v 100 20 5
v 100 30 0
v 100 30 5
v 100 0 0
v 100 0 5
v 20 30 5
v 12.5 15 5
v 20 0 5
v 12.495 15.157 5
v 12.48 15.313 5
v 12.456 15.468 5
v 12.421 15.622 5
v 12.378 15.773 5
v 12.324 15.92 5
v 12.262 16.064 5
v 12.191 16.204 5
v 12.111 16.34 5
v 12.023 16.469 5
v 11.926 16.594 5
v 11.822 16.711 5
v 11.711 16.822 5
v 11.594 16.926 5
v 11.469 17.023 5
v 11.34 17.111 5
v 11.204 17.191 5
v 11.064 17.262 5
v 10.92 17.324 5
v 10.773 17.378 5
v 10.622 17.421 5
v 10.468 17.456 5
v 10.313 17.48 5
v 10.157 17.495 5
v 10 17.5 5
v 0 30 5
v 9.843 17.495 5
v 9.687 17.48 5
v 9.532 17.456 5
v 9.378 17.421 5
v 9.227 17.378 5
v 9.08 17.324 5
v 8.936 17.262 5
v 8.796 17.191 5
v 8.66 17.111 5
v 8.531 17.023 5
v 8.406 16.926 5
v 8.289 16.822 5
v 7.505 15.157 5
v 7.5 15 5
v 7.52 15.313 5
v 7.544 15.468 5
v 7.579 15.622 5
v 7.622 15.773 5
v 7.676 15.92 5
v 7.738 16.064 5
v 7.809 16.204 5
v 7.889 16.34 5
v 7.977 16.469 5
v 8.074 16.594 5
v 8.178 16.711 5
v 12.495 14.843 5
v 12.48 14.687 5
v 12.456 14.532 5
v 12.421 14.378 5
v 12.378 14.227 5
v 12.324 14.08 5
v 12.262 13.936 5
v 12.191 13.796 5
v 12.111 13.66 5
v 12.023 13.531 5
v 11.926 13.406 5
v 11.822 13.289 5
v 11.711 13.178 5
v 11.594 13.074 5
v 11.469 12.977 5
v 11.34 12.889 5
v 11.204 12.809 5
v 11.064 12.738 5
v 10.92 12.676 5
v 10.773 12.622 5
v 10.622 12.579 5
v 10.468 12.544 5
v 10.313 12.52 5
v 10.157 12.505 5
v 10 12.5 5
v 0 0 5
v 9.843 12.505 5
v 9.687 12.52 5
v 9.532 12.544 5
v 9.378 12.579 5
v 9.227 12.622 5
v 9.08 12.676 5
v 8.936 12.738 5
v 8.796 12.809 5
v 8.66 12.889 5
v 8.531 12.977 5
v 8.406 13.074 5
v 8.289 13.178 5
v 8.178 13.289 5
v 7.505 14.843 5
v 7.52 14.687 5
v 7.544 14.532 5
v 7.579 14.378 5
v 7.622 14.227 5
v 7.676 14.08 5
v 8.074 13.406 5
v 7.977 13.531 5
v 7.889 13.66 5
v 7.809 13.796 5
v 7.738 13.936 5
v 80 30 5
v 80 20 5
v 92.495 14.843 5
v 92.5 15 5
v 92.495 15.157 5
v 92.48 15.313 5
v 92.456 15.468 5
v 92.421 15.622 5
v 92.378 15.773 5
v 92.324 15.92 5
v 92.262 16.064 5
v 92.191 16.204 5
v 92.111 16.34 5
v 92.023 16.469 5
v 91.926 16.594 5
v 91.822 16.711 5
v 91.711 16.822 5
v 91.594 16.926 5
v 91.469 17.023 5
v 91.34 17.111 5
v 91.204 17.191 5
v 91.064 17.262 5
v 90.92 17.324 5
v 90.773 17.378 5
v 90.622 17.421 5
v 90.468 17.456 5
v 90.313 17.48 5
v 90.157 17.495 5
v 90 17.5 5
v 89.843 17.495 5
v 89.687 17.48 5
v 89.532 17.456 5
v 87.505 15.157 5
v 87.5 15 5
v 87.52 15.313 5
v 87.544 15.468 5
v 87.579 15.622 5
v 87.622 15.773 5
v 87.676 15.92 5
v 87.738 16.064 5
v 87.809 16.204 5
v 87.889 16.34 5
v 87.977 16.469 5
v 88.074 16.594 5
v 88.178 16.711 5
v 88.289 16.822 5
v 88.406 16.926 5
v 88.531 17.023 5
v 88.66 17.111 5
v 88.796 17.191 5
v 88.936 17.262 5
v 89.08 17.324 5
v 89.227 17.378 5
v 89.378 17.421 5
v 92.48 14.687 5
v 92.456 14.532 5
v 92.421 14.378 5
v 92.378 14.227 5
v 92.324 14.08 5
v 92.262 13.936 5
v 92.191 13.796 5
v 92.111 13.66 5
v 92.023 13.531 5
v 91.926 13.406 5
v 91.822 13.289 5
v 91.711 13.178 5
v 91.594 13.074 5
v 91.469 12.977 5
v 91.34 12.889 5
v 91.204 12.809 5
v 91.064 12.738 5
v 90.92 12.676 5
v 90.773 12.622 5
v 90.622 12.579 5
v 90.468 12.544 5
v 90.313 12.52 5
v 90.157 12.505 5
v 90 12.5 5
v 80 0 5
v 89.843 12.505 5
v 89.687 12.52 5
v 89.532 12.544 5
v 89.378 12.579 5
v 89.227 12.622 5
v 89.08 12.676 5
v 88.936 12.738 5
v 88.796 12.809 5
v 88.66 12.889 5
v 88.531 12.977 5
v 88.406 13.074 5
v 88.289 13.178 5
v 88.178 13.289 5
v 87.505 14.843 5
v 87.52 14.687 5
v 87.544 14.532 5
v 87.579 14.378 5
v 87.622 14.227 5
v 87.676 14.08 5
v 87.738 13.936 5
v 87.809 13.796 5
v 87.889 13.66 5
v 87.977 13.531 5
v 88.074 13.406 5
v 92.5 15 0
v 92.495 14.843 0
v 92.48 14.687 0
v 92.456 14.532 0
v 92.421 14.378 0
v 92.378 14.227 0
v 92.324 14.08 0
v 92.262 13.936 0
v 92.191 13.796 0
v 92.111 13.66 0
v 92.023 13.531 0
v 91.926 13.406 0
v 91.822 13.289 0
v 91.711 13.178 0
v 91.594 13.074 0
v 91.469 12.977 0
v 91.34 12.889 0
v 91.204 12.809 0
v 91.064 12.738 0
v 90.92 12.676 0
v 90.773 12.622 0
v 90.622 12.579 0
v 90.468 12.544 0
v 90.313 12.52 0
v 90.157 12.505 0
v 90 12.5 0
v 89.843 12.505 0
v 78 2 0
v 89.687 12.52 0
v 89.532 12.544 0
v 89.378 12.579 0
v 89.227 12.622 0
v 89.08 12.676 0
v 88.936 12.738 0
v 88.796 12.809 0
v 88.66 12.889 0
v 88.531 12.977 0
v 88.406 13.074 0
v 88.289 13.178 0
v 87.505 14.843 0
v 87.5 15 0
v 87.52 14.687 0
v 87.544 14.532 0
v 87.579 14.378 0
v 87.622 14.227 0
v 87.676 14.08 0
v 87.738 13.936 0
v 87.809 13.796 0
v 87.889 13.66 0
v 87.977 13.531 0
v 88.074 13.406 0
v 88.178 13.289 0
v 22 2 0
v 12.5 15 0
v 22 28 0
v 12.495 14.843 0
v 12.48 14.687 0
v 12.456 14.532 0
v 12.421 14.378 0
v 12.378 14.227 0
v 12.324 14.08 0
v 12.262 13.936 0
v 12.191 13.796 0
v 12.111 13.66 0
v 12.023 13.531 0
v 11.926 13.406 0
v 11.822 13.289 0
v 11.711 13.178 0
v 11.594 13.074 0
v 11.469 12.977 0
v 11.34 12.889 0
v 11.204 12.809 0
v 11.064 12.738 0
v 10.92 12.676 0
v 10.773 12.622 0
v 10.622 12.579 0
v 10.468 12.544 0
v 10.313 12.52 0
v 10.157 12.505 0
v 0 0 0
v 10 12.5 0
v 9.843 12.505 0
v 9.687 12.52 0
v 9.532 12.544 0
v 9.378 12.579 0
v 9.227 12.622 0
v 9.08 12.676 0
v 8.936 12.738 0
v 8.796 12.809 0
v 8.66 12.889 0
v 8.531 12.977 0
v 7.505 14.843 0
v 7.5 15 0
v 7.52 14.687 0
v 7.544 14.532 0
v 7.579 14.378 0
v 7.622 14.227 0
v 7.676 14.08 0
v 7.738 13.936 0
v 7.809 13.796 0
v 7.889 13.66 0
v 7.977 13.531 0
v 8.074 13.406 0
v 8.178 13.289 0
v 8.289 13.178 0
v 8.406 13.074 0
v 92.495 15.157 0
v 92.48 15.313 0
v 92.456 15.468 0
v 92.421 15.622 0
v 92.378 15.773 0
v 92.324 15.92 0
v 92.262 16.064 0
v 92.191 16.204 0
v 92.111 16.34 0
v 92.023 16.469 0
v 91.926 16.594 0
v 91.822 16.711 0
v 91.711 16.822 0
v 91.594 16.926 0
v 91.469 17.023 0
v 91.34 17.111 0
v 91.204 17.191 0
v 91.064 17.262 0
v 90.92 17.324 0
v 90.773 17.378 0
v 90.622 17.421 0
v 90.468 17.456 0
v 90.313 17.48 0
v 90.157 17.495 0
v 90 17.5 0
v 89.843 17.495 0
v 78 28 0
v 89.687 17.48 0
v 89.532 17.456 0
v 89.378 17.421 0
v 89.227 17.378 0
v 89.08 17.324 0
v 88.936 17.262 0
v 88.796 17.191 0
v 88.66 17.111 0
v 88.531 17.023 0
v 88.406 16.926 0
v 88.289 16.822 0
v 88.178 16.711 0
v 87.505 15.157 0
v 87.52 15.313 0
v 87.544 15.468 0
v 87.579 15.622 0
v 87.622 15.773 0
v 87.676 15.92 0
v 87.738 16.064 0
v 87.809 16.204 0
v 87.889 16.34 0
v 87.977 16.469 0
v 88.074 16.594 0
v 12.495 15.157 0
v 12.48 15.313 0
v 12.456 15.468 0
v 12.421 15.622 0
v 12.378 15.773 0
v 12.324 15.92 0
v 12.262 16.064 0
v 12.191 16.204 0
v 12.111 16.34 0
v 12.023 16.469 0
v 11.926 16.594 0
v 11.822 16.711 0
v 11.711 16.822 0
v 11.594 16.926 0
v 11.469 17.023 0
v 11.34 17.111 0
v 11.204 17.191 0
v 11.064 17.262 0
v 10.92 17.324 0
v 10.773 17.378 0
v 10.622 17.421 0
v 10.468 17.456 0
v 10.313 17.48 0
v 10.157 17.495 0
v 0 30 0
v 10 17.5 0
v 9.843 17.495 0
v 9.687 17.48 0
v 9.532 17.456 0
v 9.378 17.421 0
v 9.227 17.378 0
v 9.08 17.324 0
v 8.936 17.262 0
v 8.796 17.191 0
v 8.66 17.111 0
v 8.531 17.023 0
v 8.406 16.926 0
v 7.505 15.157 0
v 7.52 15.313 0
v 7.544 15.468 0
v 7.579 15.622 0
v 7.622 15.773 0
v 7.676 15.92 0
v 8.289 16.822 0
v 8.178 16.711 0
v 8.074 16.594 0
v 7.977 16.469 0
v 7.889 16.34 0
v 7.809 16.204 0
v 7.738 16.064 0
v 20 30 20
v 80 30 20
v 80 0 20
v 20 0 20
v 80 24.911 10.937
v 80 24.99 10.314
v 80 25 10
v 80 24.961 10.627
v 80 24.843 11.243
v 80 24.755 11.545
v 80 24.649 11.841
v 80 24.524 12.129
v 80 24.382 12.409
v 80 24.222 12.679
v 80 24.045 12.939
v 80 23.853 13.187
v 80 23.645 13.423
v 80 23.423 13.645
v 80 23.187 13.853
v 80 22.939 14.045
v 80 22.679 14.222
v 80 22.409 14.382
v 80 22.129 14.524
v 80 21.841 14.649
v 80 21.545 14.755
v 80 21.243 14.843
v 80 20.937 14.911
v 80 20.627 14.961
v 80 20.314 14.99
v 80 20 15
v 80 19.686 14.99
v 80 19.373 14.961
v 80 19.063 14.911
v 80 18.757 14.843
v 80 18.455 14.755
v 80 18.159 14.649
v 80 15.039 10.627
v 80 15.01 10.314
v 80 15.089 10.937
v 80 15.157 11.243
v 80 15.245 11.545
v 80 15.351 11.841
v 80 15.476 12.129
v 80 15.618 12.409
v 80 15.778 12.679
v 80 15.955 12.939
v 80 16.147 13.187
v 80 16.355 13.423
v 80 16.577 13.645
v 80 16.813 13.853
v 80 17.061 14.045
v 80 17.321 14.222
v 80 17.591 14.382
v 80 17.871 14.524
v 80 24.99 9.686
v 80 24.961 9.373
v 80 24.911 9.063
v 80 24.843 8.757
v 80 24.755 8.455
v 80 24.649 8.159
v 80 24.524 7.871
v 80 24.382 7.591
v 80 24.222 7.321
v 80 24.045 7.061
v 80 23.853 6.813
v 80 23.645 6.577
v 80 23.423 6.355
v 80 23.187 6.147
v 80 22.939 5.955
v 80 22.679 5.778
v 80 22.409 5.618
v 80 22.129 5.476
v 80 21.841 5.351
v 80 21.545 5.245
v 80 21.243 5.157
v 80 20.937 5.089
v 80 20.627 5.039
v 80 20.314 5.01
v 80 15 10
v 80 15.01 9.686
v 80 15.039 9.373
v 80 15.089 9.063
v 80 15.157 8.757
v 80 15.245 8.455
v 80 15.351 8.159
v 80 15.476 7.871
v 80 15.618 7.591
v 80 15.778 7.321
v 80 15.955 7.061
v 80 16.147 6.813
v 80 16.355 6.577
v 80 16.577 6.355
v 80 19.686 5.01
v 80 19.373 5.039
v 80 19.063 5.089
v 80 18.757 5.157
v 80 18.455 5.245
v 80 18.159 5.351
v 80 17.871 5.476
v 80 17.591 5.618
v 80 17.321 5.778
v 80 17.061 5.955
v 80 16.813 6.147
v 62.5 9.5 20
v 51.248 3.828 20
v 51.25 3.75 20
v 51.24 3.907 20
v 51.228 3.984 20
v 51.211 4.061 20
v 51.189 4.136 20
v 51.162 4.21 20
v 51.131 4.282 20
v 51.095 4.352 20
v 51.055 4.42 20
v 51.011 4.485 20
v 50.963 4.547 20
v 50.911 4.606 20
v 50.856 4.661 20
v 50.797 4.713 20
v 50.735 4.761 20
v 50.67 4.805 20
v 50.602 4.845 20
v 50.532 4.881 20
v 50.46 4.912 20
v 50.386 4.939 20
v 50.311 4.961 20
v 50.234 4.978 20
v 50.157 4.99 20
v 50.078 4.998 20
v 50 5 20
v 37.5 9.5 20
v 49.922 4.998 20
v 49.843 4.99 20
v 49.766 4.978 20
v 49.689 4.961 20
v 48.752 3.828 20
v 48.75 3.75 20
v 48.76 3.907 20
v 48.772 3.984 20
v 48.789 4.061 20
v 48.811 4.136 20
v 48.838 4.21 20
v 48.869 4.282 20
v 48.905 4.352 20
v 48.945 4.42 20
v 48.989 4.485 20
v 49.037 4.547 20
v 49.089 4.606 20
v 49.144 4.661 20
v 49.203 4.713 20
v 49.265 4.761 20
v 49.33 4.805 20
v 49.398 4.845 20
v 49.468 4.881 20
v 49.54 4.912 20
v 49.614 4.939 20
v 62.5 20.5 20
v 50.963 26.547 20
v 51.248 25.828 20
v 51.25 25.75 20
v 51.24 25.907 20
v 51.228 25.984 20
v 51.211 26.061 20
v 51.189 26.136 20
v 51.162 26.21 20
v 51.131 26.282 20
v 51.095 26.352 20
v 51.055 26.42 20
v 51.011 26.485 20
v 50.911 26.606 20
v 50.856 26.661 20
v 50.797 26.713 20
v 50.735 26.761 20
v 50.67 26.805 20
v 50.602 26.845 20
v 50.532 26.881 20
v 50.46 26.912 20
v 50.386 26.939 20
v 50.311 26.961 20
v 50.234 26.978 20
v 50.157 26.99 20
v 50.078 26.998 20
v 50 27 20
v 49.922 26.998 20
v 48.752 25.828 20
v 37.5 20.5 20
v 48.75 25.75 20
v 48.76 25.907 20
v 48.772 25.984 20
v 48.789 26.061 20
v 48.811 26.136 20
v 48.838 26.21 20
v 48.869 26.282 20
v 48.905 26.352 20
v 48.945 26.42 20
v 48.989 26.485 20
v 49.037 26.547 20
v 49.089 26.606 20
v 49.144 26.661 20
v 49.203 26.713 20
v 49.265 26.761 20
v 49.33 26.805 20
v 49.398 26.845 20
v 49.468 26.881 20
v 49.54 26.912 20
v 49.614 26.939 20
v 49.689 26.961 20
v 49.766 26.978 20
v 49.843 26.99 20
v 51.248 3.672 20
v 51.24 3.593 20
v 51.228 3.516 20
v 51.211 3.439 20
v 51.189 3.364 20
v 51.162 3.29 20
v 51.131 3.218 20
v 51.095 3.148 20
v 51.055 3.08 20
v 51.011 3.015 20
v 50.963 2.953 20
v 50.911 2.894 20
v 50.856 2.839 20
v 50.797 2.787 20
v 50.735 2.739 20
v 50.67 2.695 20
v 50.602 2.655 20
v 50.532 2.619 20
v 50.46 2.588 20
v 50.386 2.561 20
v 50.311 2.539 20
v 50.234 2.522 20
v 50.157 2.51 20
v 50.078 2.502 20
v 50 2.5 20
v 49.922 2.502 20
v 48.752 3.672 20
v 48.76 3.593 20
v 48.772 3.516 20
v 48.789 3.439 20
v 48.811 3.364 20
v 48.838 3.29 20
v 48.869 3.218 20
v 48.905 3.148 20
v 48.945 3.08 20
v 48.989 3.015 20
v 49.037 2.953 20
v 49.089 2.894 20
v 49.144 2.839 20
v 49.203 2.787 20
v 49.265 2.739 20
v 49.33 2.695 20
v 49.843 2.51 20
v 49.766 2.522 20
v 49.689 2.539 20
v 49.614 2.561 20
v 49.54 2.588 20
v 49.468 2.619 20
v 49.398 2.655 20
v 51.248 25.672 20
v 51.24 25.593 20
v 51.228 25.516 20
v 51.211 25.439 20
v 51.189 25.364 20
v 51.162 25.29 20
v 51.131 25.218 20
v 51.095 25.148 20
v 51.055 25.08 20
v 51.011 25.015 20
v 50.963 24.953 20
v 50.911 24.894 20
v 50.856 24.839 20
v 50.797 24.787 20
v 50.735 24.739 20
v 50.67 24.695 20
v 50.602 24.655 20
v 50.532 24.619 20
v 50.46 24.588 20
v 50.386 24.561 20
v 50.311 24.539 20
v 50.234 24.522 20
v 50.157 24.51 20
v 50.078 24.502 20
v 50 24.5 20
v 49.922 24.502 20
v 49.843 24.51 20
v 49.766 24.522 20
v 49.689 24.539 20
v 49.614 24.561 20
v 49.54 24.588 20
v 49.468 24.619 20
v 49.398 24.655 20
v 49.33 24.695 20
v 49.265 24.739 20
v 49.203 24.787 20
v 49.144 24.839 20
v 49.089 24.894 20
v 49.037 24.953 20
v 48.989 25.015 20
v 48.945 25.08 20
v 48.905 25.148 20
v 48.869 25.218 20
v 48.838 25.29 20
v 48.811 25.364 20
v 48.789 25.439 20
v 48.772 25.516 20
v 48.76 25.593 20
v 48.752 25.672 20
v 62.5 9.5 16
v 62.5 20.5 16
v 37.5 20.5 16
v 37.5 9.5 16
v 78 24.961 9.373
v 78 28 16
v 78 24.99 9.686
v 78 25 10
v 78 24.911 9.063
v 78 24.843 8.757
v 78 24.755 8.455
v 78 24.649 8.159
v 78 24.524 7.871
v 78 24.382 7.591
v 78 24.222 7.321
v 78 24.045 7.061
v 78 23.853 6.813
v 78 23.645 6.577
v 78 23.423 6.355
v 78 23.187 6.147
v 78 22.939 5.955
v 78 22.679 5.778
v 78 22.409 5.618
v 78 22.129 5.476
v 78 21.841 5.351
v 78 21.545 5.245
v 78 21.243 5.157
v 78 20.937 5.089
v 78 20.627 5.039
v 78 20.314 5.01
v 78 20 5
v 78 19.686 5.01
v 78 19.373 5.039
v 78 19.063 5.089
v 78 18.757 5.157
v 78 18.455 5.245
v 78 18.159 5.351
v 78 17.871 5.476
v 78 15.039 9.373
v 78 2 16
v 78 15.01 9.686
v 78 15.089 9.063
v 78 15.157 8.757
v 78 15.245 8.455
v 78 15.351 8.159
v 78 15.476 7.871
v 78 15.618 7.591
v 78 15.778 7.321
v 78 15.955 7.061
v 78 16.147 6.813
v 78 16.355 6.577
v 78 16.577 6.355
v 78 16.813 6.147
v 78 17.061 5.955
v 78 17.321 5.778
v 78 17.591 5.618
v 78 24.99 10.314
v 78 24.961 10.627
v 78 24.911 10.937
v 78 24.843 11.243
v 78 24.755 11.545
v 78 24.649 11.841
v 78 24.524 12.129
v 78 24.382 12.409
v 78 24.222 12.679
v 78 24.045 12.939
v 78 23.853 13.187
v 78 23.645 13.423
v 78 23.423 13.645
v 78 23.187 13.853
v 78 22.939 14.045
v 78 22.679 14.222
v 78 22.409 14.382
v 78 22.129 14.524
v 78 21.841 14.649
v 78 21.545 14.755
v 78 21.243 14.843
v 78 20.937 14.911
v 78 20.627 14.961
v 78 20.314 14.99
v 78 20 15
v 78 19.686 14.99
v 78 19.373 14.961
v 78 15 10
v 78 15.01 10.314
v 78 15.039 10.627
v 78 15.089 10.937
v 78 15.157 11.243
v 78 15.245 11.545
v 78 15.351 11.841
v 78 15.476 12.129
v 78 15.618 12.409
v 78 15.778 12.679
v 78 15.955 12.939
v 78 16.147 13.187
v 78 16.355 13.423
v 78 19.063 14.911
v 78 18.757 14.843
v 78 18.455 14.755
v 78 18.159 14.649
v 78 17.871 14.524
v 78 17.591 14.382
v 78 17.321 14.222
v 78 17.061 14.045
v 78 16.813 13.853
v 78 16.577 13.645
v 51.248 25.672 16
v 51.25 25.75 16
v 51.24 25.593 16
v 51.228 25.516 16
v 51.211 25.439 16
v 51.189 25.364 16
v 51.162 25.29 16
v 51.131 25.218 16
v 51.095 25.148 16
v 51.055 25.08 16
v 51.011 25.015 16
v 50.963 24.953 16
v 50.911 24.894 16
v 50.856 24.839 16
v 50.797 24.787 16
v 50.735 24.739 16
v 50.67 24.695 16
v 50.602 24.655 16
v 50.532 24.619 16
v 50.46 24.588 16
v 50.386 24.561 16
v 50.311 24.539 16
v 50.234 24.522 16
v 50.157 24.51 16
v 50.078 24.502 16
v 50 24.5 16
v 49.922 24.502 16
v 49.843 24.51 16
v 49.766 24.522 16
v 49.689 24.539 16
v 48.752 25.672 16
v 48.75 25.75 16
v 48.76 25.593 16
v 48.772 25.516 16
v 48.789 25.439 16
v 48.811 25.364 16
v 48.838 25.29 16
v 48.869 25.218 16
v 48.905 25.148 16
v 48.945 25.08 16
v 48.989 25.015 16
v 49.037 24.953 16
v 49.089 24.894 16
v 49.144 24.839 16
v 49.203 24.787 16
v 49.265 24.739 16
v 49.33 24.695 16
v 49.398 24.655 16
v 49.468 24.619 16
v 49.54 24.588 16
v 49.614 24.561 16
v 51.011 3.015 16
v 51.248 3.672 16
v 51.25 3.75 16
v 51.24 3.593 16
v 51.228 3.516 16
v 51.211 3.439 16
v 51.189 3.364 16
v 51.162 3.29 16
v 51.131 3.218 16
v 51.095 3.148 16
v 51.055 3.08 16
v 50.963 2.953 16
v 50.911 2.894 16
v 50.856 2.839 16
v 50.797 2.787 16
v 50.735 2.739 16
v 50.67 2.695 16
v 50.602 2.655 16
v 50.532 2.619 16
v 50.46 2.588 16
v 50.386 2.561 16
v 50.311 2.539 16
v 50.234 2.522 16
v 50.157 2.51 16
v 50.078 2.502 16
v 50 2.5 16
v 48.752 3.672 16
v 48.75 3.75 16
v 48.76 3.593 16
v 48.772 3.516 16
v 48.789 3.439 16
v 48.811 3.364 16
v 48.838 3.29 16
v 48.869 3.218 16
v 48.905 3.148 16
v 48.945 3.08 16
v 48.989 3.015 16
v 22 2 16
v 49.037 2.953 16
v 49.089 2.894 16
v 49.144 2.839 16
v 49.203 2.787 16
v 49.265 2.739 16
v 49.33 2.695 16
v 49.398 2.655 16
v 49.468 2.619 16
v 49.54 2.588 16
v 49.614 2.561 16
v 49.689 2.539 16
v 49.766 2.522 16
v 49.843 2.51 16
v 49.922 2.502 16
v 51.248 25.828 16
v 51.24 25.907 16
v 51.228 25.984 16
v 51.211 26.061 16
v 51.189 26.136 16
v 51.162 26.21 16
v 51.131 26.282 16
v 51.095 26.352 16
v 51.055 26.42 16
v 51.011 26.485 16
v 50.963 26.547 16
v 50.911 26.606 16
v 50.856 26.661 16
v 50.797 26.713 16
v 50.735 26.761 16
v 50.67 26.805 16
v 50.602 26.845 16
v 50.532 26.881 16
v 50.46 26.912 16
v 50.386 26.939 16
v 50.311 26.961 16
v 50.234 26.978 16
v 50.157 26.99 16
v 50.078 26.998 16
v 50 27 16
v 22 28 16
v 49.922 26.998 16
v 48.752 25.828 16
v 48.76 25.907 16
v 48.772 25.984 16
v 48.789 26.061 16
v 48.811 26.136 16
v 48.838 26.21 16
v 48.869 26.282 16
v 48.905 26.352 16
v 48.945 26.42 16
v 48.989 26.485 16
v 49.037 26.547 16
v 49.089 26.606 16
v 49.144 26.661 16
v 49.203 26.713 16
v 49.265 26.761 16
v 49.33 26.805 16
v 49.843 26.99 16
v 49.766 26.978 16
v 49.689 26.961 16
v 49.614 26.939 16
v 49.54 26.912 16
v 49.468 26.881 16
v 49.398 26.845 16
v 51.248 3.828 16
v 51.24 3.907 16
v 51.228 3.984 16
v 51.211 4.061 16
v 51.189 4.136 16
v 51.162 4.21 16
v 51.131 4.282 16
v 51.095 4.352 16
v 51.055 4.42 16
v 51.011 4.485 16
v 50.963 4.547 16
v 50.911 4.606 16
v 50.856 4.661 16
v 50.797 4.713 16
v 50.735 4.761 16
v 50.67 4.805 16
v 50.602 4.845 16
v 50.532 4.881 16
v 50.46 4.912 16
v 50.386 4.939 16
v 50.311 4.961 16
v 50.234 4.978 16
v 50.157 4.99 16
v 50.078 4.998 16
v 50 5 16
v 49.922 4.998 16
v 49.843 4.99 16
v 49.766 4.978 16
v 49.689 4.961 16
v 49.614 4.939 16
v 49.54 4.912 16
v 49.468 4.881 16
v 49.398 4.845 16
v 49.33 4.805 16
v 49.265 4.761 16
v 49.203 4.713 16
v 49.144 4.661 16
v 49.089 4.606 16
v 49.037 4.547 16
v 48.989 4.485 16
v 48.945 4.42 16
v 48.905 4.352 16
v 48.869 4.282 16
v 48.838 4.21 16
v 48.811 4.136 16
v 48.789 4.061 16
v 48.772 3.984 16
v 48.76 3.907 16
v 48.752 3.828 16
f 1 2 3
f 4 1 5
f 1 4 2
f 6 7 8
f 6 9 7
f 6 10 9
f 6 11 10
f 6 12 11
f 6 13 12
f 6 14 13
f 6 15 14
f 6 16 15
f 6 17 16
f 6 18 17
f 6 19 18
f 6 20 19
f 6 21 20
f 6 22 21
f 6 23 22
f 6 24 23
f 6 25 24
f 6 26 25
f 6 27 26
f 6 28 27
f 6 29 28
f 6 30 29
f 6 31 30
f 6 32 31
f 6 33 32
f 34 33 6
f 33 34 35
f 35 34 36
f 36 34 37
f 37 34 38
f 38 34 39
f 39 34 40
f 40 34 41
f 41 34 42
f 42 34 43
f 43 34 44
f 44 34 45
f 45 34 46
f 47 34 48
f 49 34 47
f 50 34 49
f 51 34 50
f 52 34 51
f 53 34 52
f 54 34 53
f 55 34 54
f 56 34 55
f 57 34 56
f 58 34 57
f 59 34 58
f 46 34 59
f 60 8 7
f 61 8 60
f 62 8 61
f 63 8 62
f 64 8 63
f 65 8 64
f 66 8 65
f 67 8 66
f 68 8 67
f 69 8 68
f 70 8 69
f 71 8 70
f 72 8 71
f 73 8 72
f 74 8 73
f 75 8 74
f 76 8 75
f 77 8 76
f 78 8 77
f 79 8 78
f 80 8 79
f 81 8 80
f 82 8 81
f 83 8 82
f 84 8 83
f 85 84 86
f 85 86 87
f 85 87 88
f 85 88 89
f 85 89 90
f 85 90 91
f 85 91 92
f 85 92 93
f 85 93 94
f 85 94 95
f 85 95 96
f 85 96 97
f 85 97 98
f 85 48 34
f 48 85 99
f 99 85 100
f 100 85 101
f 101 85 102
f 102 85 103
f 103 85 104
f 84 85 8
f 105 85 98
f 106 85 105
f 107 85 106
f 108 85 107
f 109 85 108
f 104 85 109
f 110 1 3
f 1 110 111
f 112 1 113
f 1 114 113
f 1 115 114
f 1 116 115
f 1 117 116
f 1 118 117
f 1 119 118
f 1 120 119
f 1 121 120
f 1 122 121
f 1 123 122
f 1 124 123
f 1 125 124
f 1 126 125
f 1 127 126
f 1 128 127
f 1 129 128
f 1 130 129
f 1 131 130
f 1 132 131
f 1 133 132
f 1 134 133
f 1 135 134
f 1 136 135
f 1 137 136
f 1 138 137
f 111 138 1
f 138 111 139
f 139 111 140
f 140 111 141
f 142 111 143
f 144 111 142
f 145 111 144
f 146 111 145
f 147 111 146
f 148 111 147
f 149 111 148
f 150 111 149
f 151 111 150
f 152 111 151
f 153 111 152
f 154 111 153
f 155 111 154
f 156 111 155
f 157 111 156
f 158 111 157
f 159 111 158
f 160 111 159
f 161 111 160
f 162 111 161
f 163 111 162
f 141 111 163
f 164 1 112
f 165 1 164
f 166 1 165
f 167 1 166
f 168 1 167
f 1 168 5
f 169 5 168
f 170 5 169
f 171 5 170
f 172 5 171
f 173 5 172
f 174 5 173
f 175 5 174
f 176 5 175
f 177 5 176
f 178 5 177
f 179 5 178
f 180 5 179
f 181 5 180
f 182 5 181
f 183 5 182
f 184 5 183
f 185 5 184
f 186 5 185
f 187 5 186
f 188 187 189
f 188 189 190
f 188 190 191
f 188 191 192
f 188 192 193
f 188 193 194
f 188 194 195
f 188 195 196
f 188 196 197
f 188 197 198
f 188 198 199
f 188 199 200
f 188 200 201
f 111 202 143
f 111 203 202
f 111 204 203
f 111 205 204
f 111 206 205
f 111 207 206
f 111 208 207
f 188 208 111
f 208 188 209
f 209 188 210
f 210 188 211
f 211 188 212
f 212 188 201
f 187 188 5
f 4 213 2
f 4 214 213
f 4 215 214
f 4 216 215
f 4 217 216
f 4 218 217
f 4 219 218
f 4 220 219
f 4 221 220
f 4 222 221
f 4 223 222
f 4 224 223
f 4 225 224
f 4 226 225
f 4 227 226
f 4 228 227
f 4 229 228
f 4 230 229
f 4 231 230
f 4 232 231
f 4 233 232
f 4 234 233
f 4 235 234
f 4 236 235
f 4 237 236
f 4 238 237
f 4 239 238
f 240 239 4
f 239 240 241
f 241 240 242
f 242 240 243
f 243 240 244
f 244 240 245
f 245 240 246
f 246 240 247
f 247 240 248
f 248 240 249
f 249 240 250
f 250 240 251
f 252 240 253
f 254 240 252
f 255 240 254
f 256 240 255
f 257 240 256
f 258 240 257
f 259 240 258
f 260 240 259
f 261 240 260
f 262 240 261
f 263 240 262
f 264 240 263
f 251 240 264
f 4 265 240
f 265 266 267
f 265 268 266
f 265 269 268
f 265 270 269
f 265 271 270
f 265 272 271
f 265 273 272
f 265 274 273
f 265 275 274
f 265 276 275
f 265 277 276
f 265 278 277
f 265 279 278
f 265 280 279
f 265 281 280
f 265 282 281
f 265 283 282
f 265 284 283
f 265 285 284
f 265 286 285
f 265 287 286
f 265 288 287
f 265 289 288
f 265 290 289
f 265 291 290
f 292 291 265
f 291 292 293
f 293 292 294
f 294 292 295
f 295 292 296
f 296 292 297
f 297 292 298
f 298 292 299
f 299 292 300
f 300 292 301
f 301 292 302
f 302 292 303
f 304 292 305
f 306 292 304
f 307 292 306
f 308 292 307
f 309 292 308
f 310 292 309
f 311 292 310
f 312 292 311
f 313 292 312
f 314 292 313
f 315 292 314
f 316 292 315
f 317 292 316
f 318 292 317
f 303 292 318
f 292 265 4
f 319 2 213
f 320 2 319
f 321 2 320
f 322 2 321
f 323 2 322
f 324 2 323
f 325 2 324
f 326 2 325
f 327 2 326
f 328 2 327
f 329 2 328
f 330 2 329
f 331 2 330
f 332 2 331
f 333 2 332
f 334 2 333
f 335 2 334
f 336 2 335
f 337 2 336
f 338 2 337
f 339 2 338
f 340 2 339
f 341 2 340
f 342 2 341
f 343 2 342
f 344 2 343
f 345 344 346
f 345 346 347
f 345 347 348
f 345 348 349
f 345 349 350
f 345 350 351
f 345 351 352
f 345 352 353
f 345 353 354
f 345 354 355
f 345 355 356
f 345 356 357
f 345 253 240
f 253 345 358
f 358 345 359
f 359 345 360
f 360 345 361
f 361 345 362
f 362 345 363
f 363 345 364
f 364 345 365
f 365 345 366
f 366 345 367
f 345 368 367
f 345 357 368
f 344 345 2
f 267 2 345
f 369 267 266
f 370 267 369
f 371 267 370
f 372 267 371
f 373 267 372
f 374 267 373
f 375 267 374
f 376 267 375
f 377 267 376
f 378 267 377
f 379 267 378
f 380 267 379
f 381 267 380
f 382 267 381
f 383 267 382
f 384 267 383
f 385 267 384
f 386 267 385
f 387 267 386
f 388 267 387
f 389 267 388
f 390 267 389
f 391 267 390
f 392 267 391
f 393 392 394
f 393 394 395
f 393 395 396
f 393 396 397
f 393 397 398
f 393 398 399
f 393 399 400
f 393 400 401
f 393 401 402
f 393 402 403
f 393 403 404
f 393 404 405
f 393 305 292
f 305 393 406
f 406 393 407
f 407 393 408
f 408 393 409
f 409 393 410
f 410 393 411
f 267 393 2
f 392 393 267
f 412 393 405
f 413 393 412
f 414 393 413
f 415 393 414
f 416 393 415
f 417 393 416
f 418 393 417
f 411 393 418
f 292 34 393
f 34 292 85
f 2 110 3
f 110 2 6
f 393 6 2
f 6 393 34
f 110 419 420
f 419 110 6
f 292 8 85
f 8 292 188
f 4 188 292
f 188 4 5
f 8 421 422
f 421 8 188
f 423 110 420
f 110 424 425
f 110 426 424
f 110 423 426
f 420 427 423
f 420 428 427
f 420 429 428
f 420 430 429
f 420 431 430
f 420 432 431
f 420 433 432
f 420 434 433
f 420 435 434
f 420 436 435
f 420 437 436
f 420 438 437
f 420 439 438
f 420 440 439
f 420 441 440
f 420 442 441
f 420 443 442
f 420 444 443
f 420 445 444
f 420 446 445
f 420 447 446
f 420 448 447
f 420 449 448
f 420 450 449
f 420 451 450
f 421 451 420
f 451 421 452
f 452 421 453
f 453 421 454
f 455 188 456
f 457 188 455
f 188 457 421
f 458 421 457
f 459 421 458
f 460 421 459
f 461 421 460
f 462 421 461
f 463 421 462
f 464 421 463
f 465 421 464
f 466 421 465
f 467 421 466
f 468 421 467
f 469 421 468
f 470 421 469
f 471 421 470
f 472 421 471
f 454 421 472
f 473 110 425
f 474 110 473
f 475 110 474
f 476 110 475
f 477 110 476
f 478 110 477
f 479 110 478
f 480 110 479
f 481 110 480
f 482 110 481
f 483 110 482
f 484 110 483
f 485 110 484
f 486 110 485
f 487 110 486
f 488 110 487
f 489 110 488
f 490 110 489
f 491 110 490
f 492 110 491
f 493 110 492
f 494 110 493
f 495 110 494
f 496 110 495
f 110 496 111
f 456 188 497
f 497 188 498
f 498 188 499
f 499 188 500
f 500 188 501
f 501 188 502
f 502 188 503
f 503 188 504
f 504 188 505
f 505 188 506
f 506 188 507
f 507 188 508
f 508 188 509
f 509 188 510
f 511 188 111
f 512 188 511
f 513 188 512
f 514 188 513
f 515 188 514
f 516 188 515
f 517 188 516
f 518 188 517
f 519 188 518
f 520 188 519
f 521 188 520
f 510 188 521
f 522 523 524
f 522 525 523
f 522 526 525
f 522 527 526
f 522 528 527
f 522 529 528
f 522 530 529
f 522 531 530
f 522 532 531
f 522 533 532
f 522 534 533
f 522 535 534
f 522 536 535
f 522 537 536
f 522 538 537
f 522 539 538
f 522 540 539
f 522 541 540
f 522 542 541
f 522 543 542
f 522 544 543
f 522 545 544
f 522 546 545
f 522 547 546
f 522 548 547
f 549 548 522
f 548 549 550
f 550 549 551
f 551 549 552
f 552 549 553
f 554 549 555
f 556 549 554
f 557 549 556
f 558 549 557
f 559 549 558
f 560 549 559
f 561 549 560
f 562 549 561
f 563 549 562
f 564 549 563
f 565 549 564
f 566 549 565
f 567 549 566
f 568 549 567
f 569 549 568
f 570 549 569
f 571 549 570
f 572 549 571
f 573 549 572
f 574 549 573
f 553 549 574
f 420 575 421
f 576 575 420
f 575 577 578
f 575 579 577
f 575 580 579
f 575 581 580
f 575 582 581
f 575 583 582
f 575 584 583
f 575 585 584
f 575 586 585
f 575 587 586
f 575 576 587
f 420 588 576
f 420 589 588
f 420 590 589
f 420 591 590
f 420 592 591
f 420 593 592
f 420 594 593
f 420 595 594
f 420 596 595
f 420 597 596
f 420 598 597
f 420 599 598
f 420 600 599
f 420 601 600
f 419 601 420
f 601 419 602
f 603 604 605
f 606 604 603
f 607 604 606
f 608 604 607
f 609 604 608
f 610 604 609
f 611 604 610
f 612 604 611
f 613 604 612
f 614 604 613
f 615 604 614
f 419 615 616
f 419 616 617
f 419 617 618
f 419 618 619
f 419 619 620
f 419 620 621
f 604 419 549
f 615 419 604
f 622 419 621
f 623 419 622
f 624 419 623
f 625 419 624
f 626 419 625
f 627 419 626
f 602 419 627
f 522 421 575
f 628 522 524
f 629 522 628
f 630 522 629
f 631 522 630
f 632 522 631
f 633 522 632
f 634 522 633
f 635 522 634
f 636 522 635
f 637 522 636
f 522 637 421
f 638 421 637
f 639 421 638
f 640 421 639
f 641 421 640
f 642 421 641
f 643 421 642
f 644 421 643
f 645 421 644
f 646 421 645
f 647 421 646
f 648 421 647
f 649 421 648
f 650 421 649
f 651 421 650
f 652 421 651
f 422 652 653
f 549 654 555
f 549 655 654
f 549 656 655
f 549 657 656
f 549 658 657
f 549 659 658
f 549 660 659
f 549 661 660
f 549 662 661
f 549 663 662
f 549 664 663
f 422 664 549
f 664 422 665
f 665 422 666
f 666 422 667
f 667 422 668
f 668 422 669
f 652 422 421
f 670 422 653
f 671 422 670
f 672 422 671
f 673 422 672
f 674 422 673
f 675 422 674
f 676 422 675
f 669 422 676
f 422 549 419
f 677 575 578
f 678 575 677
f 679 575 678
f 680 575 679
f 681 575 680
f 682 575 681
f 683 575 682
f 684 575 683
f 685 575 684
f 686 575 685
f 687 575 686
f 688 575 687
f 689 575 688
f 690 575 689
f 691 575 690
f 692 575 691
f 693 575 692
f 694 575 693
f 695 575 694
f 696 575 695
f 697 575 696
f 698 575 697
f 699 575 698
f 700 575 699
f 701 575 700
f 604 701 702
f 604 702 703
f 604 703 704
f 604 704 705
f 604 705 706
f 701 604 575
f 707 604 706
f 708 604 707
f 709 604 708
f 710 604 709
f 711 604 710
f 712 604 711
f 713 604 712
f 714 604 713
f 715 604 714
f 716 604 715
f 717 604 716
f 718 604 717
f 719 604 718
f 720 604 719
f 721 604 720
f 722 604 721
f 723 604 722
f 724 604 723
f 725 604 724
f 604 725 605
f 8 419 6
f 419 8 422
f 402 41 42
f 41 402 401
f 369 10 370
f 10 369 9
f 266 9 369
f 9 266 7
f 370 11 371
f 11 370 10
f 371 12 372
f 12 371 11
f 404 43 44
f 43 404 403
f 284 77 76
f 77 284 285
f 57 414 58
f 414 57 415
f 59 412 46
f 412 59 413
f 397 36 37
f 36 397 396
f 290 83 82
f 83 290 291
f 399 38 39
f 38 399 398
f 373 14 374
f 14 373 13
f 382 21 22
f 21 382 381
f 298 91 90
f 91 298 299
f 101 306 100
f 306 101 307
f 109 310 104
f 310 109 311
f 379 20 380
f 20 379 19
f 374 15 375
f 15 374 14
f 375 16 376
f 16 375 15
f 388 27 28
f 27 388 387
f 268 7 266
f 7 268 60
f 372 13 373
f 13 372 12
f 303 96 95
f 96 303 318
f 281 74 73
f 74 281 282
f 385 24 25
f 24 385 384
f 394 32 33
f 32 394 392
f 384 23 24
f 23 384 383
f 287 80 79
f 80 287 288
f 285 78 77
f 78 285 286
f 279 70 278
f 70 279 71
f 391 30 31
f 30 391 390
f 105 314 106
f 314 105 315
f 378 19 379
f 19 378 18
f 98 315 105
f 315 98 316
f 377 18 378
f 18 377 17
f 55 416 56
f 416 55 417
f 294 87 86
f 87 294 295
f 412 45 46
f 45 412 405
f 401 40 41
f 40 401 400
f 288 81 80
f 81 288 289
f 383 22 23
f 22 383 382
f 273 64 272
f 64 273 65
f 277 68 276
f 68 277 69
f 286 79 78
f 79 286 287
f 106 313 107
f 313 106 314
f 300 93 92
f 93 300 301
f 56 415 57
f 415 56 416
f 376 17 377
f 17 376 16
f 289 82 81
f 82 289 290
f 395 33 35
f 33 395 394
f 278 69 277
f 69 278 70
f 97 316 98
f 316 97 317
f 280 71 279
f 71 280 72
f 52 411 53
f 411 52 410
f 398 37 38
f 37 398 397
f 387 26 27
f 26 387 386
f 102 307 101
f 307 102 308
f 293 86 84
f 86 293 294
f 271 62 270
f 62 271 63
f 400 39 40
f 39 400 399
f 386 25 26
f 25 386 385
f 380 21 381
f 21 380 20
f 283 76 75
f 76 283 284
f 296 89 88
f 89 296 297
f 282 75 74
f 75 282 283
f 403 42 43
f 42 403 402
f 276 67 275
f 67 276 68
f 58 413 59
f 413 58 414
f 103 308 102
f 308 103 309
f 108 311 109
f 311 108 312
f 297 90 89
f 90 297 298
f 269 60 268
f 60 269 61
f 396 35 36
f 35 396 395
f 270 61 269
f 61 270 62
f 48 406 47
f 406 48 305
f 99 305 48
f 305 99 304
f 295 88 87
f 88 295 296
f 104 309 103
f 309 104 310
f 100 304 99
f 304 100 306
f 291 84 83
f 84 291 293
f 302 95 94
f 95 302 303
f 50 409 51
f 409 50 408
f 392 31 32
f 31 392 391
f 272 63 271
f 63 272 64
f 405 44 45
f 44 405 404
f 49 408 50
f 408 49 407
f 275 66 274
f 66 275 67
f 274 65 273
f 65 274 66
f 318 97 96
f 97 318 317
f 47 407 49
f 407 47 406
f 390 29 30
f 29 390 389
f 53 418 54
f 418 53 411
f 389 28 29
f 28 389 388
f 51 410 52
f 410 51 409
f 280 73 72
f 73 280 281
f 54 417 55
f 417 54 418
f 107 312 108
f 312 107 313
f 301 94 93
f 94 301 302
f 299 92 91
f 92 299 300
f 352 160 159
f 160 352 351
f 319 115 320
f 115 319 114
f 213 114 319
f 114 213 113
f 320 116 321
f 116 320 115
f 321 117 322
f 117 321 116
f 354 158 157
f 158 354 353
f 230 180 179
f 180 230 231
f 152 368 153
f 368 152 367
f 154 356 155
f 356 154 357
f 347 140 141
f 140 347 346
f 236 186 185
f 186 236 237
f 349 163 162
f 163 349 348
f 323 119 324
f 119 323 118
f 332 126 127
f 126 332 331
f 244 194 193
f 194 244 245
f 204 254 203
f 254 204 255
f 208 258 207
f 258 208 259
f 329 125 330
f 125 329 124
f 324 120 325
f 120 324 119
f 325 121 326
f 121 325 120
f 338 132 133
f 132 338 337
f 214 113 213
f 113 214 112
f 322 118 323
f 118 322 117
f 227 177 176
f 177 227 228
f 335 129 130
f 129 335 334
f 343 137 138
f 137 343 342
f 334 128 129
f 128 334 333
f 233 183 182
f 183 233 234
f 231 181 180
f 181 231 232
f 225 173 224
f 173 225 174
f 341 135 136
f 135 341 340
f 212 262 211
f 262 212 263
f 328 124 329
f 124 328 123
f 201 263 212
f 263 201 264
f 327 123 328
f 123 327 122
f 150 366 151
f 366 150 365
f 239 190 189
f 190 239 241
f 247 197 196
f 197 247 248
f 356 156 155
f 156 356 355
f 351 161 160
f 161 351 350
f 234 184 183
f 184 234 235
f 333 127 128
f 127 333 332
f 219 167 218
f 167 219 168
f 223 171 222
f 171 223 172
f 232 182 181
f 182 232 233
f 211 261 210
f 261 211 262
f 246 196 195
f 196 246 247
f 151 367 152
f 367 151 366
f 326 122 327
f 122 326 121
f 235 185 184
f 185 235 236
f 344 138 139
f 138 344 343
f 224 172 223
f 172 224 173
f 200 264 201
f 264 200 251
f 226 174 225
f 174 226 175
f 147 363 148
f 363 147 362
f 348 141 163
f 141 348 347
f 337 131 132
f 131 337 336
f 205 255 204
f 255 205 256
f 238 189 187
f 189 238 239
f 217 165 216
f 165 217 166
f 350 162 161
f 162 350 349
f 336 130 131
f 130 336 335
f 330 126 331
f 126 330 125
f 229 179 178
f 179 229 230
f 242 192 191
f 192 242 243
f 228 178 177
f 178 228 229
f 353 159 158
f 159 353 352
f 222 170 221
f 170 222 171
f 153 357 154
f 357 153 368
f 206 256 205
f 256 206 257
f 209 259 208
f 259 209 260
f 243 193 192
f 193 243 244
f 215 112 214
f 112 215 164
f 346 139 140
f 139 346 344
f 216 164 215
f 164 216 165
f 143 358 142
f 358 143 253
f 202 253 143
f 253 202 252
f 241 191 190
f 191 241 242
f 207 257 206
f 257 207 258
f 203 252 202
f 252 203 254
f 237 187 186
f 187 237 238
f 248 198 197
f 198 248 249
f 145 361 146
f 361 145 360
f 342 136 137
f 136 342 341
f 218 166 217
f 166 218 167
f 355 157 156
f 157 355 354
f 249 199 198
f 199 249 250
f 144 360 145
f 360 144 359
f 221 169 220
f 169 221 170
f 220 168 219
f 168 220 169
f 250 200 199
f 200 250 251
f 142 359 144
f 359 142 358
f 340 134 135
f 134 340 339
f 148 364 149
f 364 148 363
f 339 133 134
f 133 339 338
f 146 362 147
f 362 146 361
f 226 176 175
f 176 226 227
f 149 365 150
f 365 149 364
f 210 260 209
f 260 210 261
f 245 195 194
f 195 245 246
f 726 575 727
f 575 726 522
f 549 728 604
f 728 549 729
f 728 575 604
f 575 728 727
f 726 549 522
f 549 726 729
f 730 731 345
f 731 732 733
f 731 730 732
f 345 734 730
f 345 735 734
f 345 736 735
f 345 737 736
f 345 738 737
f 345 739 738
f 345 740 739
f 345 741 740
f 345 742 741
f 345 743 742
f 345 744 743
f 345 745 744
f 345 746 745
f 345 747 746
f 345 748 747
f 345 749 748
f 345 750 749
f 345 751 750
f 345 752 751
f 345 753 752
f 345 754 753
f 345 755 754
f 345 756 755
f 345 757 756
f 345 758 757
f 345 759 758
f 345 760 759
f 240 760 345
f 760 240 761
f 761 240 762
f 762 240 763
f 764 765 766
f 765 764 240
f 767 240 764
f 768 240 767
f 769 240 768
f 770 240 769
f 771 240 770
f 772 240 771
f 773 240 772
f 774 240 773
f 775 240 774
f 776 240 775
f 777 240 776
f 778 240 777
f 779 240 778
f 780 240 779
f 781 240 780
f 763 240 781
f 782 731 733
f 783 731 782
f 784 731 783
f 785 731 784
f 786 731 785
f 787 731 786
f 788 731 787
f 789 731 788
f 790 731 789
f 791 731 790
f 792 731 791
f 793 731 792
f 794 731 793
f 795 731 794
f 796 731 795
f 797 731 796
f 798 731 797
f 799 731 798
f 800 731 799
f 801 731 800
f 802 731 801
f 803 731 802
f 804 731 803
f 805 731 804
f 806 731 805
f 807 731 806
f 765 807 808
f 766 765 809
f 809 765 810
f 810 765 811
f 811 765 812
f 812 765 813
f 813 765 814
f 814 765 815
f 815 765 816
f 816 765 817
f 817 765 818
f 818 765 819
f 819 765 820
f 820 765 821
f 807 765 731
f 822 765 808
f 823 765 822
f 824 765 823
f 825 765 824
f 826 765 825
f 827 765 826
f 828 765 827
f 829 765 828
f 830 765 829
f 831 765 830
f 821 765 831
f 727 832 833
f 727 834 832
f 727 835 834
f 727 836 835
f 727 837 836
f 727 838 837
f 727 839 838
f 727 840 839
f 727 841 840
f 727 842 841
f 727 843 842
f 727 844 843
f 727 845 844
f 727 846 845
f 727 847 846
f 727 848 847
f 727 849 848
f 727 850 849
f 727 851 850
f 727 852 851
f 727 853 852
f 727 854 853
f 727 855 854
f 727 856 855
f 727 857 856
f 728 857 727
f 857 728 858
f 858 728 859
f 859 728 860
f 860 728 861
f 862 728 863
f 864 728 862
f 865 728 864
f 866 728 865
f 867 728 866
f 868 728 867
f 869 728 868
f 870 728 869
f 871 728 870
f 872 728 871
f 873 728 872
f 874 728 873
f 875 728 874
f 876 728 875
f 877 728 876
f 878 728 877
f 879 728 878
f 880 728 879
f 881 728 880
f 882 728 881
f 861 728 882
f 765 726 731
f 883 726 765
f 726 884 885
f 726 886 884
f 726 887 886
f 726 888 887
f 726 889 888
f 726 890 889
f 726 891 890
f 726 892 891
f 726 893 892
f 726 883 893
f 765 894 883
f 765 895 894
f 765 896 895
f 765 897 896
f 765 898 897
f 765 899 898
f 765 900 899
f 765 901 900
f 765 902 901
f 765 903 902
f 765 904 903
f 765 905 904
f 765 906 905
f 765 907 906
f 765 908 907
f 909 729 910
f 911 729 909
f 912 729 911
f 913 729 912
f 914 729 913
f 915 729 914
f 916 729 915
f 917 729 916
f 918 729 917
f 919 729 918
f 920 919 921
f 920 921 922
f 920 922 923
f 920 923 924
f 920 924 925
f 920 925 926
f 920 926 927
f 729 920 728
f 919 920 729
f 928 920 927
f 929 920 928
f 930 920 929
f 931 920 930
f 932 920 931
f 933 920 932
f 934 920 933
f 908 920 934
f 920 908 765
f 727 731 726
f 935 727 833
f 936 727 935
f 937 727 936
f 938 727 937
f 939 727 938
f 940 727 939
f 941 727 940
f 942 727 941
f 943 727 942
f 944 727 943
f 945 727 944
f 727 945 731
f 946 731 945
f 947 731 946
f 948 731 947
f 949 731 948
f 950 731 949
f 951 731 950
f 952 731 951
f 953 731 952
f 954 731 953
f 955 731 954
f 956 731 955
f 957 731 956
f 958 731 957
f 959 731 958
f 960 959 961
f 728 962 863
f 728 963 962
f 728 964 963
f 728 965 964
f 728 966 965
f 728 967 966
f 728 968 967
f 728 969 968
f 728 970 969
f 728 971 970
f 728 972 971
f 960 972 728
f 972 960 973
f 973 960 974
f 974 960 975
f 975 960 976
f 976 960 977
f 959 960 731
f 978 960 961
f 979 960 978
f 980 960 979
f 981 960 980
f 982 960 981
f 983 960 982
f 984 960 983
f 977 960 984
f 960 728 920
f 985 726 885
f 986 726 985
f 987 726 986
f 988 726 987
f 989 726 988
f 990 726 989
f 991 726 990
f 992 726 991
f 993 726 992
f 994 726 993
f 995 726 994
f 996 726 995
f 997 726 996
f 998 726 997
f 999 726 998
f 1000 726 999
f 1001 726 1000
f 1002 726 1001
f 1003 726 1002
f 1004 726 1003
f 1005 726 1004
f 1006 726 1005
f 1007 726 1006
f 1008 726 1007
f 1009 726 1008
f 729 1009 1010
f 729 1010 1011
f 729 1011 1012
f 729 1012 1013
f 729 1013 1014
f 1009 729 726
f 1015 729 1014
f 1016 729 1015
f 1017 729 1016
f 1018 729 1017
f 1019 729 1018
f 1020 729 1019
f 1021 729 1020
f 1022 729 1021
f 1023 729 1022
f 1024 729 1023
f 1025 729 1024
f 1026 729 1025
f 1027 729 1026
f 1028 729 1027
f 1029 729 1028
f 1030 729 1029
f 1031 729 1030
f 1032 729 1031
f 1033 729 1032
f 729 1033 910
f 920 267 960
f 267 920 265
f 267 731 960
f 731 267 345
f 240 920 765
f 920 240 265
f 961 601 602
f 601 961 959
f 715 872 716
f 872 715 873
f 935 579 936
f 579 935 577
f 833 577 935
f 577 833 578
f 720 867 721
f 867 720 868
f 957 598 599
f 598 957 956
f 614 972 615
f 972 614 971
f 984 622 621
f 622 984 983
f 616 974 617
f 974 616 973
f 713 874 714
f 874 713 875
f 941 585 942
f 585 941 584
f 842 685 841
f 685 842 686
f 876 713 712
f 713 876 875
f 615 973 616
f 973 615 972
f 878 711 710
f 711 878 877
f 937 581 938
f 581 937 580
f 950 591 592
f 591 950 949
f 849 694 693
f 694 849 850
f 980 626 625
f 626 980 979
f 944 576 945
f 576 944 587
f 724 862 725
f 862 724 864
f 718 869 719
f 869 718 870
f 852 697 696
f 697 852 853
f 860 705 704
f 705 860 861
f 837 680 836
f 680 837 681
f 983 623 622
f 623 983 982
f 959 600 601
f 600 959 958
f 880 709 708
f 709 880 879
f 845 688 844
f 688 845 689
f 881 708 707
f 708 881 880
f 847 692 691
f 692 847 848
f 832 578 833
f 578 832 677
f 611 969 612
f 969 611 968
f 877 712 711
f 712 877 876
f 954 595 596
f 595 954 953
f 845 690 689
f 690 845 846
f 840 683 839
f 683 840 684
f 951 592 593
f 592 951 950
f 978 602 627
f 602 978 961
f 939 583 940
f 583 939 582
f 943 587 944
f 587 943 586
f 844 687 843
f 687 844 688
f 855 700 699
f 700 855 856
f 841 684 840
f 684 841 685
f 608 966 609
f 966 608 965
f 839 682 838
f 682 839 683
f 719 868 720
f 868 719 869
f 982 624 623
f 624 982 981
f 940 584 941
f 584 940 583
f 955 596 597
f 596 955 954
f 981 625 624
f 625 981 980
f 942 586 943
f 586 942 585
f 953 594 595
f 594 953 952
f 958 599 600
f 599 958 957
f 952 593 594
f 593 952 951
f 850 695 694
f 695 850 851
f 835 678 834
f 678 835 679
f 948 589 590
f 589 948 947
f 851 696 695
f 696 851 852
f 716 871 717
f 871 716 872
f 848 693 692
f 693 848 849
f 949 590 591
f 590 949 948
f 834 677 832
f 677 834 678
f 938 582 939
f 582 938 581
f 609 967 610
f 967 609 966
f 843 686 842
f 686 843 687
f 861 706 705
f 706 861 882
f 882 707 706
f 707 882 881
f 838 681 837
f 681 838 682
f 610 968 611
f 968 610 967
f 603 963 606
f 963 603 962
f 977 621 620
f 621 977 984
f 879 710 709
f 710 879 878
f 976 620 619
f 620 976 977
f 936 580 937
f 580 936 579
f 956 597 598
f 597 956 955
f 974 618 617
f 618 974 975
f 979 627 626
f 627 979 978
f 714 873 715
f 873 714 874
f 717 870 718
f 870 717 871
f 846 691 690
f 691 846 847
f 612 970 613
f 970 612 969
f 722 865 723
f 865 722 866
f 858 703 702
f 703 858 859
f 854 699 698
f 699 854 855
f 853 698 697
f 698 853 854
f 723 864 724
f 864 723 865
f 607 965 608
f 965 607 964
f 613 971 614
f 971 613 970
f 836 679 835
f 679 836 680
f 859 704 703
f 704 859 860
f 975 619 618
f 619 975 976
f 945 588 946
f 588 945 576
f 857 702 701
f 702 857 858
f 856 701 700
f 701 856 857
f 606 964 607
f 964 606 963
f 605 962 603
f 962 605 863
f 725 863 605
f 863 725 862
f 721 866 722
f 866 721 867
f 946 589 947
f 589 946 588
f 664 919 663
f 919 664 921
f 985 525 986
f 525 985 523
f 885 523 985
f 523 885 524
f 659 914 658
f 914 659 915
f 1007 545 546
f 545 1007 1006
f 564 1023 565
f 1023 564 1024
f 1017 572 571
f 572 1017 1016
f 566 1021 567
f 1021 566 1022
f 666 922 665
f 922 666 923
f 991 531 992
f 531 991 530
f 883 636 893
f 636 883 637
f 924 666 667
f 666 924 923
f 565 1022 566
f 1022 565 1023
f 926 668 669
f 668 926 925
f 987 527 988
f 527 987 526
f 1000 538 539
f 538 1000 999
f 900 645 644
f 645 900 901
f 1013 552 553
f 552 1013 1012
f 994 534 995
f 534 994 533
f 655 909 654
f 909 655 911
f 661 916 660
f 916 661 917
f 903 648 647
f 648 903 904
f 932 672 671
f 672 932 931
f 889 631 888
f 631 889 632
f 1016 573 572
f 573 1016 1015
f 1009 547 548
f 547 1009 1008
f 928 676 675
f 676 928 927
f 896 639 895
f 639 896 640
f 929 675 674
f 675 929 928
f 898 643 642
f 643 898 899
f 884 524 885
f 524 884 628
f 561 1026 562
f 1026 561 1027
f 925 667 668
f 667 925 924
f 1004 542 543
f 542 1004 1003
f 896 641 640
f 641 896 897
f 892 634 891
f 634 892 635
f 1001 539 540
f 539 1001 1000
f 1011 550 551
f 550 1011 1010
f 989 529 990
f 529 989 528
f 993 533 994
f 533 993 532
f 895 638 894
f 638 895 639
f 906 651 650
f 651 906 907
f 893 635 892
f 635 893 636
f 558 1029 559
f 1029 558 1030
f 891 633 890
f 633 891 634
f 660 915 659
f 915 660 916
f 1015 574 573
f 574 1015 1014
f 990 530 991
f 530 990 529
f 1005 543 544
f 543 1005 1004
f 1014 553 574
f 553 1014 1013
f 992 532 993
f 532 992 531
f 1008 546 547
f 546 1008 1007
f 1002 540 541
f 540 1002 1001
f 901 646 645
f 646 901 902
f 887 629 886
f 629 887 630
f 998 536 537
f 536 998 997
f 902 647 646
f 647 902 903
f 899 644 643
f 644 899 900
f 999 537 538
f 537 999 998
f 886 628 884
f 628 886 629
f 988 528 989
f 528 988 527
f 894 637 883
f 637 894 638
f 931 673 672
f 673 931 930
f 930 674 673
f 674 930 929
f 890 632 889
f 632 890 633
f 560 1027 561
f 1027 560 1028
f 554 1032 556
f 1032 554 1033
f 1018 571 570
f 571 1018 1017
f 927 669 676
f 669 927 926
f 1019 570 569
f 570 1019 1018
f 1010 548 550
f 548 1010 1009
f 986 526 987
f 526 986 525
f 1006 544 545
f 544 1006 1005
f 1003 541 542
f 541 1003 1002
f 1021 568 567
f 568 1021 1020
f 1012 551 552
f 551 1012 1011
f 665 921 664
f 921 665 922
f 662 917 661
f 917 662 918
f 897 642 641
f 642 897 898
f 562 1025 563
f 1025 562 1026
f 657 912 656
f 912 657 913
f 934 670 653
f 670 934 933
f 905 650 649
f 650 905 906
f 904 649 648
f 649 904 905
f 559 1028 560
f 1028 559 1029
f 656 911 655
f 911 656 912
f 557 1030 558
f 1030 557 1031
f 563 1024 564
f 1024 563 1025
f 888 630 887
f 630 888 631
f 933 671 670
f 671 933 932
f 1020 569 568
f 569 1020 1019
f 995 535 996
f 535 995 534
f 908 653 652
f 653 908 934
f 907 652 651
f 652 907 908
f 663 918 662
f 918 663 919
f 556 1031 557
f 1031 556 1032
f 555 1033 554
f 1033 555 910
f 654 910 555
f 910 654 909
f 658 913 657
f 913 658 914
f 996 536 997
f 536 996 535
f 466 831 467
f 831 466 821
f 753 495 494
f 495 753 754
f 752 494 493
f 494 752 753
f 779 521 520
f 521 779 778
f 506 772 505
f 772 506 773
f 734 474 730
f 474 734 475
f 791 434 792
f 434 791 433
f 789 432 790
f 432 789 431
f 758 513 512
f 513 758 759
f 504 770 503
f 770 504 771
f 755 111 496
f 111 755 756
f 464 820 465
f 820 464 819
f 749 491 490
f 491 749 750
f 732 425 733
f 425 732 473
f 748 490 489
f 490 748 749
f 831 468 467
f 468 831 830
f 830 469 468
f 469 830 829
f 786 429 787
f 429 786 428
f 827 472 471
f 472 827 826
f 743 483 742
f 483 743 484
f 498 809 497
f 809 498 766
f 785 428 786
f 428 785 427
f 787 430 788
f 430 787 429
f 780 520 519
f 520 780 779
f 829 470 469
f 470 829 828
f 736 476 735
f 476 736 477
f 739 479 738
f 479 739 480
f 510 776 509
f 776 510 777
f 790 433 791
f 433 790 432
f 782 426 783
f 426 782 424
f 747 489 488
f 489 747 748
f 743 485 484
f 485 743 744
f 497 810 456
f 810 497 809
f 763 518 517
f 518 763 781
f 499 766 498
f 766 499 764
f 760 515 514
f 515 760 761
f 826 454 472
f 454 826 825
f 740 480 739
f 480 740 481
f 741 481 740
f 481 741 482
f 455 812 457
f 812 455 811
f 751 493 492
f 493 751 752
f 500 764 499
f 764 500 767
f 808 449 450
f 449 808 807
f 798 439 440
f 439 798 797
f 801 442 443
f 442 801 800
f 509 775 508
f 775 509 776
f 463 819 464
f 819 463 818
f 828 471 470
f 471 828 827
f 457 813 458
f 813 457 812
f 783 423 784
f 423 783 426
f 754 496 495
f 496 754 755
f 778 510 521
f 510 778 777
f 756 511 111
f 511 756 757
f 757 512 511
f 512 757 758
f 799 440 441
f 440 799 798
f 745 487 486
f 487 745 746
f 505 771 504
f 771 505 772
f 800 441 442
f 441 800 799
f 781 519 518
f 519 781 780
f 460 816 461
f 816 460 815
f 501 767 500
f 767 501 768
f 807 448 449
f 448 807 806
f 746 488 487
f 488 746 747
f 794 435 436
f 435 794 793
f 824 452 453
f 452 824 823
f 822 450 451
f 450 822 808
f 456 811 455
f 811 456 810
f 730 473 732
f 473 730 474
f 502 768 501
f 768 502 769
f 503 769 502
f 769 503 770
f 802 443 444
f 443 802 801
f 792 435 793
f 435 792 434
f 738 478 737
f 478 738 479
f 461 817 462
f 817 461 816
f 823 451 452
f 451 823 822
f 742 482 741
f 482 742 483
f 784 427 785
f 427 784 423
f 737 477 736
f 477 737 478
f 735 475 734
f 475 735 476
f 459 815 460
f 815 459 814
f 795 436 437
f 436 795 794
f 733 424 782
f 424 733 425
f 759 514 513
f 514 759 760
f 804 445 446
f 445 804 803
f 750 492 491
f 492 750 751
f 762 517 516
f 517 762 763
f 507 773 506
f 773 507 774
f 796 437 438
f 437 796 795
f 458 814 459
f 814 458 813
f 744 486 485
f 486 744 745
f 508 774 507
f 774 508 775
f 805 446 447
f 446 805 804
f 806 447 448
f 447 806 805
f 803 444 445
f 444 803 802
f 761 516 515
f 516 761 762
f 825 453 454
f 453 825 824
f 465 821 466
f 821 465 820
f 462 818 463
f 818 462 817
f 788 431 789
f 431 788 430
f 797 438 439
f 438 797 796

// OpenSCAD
$fn=100;

$base_x=100;
$base_y=30;
$base_z=5;
$top_z=20;
$switch_x=25;
$switch_y=11;

$hole=5;

difference()
    {
    union() {
        //  wallmount
        cube([$base_x,$base_y,$base_z]);
        // base plate    
        translate([$hole*4,0,0]) cube([$base_x-$hole*8,$base_y,$top_z]);
        }

    //screw hole
    translate([0+$hole*2,$base_y/2,0]) cylinder($base_z,$hole/2,$hole/2);
    
    //screw hole
    translate([$base_x-$hole*2,$base_y/2,0]) cylinder($base_z+1,$hole/2,$hole/2);
    
    // top hole
    translate([$base_x/2-$switch_x/2,$base_y/2-$switch_y/2,$base_z]) 
    cube([$switch_x,$switch_y,$top_z-$base_z]);
    
    // bottom hole
    translate([$hole*4+2,2,0-4]) cube([$base_x-$hole*8-4,$base_y-4,$top_z]);
    
    // screw hole
    translate([$base_x/2,$base_y/2-$hole/4+12,0]) cylinder(100,$hole/4,$hole/4);
    translate([$base_x/2,$base_y/2-$hole/4-10,0]) cylinder(100,$hole/4,$hole/4);  
    
    // wire hole
    translate([$base_x/2,$base_y/2+$hole,$top_z/2]) rotate([0,90,0]) cylinder(100,$hole,$hole);
  }
  
  
 
